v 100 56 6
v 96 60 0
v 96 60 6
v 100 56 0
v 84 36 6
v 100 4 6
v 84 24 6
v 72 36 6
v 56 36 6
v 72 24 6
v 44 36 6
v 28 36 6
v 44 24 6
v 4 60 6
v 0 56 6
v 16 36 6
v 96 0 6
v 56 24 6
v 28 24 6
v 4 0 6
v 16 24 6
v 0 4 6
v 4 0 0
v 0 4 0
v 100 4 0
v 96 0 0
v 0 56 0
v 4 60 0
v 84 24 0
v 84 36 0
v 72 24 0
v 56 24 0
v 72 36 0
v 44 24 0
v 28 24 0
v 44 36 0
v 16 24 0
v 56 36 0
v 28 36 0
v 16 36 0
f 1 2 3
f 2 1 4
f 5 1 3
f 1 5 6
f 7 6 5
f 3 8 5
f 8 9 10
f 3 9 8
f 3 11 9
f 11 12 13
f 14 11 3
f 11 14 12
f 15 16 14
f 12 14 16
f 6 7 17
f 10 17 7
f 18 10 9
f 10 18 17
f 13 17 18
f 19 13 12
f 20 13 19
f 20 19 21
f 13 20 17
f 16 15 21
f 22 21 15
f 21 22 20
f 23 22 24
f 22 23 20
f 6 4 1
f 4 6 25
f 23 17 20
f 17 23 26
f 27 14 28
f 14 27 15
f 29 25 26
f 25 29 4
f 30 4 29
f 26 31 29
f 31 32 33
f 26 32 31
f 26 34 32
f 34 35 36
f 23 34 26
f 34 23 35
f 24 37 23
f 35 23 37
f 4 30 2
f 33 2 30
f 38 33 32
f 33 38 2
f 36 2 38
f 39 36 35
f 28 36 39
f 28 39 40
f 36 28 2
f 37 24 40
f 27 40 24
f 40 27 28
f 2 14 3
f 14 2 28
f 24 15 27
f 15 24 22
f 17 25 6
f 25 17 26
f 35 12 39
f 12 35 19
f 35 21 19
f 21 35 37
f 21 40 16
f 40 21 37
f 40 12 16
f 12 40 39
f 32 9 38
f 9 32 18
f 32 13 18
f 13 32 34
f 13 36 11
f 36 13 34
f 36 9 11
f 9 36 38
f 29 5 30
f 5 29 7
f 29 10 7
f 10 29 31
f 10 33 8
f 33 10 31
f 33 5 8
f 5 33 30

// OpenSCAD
$fn = 32;

// ----------------------------------------------------------------------
// Windowed plate: 3 voids, 100 x 60 x 6 mm
// ----------------------------------------------------------------------

// --- parameters (mm) ---
plate_l = 100;            // plate length, X
plate_w = 60;             // plate width, Y
plate_t = 6;              // plate thickness, Z
edge_margin = 8;          // wall from the plate edge to any window
windows = 3;              // number of windows in the row
win_l = 12;               // window length
win_w = 12;               // window width
win_pitch = 28;           // window pitch along X
depth_1 = 6;              // depth of void 1 (full thickness = through)
depth_2 = 6;              // depth of void 2 (full thickness = through)
depth_3 = 6;              // depth of void 3 (full thickness = through)
corner_c = 4;             // corner chamfer of the plate

profile = [[4, 0], [96, 0], [100, 4], [100, 56], [96, 60], [4, 60], [0, 56], [0, 4]];  // primary outline, 8 points, counter clockwise
void_1 = [[16, 24], [28, 24], [28, 36], [16, 36]];  // window 1 of the row, 4 points
void_2 = [[44, 24], [56, 24], [56, 36], [44, 36]];  // window 2 of the row, 4 points
void_3 = [[72, 24], [84, 24], [84, 36], [72, 36]];  // window 3 of the row, 4 points

// --- the one profile operation ---
difference() {
  linear_extrude(height = plate_t) polygon(points = profile);
  translate([0, 0, -1])
    linear_extrude(height = plate_t + 2) polygon(points = void_1);
  translate([0, 0, -1])
    linear_extrude(height = plate_t + 2) polygon(points = void_2);
  translate([0, 0, -1])
    linear_extrude(height = plate_t + 2) polygon(points = void_3);
}
